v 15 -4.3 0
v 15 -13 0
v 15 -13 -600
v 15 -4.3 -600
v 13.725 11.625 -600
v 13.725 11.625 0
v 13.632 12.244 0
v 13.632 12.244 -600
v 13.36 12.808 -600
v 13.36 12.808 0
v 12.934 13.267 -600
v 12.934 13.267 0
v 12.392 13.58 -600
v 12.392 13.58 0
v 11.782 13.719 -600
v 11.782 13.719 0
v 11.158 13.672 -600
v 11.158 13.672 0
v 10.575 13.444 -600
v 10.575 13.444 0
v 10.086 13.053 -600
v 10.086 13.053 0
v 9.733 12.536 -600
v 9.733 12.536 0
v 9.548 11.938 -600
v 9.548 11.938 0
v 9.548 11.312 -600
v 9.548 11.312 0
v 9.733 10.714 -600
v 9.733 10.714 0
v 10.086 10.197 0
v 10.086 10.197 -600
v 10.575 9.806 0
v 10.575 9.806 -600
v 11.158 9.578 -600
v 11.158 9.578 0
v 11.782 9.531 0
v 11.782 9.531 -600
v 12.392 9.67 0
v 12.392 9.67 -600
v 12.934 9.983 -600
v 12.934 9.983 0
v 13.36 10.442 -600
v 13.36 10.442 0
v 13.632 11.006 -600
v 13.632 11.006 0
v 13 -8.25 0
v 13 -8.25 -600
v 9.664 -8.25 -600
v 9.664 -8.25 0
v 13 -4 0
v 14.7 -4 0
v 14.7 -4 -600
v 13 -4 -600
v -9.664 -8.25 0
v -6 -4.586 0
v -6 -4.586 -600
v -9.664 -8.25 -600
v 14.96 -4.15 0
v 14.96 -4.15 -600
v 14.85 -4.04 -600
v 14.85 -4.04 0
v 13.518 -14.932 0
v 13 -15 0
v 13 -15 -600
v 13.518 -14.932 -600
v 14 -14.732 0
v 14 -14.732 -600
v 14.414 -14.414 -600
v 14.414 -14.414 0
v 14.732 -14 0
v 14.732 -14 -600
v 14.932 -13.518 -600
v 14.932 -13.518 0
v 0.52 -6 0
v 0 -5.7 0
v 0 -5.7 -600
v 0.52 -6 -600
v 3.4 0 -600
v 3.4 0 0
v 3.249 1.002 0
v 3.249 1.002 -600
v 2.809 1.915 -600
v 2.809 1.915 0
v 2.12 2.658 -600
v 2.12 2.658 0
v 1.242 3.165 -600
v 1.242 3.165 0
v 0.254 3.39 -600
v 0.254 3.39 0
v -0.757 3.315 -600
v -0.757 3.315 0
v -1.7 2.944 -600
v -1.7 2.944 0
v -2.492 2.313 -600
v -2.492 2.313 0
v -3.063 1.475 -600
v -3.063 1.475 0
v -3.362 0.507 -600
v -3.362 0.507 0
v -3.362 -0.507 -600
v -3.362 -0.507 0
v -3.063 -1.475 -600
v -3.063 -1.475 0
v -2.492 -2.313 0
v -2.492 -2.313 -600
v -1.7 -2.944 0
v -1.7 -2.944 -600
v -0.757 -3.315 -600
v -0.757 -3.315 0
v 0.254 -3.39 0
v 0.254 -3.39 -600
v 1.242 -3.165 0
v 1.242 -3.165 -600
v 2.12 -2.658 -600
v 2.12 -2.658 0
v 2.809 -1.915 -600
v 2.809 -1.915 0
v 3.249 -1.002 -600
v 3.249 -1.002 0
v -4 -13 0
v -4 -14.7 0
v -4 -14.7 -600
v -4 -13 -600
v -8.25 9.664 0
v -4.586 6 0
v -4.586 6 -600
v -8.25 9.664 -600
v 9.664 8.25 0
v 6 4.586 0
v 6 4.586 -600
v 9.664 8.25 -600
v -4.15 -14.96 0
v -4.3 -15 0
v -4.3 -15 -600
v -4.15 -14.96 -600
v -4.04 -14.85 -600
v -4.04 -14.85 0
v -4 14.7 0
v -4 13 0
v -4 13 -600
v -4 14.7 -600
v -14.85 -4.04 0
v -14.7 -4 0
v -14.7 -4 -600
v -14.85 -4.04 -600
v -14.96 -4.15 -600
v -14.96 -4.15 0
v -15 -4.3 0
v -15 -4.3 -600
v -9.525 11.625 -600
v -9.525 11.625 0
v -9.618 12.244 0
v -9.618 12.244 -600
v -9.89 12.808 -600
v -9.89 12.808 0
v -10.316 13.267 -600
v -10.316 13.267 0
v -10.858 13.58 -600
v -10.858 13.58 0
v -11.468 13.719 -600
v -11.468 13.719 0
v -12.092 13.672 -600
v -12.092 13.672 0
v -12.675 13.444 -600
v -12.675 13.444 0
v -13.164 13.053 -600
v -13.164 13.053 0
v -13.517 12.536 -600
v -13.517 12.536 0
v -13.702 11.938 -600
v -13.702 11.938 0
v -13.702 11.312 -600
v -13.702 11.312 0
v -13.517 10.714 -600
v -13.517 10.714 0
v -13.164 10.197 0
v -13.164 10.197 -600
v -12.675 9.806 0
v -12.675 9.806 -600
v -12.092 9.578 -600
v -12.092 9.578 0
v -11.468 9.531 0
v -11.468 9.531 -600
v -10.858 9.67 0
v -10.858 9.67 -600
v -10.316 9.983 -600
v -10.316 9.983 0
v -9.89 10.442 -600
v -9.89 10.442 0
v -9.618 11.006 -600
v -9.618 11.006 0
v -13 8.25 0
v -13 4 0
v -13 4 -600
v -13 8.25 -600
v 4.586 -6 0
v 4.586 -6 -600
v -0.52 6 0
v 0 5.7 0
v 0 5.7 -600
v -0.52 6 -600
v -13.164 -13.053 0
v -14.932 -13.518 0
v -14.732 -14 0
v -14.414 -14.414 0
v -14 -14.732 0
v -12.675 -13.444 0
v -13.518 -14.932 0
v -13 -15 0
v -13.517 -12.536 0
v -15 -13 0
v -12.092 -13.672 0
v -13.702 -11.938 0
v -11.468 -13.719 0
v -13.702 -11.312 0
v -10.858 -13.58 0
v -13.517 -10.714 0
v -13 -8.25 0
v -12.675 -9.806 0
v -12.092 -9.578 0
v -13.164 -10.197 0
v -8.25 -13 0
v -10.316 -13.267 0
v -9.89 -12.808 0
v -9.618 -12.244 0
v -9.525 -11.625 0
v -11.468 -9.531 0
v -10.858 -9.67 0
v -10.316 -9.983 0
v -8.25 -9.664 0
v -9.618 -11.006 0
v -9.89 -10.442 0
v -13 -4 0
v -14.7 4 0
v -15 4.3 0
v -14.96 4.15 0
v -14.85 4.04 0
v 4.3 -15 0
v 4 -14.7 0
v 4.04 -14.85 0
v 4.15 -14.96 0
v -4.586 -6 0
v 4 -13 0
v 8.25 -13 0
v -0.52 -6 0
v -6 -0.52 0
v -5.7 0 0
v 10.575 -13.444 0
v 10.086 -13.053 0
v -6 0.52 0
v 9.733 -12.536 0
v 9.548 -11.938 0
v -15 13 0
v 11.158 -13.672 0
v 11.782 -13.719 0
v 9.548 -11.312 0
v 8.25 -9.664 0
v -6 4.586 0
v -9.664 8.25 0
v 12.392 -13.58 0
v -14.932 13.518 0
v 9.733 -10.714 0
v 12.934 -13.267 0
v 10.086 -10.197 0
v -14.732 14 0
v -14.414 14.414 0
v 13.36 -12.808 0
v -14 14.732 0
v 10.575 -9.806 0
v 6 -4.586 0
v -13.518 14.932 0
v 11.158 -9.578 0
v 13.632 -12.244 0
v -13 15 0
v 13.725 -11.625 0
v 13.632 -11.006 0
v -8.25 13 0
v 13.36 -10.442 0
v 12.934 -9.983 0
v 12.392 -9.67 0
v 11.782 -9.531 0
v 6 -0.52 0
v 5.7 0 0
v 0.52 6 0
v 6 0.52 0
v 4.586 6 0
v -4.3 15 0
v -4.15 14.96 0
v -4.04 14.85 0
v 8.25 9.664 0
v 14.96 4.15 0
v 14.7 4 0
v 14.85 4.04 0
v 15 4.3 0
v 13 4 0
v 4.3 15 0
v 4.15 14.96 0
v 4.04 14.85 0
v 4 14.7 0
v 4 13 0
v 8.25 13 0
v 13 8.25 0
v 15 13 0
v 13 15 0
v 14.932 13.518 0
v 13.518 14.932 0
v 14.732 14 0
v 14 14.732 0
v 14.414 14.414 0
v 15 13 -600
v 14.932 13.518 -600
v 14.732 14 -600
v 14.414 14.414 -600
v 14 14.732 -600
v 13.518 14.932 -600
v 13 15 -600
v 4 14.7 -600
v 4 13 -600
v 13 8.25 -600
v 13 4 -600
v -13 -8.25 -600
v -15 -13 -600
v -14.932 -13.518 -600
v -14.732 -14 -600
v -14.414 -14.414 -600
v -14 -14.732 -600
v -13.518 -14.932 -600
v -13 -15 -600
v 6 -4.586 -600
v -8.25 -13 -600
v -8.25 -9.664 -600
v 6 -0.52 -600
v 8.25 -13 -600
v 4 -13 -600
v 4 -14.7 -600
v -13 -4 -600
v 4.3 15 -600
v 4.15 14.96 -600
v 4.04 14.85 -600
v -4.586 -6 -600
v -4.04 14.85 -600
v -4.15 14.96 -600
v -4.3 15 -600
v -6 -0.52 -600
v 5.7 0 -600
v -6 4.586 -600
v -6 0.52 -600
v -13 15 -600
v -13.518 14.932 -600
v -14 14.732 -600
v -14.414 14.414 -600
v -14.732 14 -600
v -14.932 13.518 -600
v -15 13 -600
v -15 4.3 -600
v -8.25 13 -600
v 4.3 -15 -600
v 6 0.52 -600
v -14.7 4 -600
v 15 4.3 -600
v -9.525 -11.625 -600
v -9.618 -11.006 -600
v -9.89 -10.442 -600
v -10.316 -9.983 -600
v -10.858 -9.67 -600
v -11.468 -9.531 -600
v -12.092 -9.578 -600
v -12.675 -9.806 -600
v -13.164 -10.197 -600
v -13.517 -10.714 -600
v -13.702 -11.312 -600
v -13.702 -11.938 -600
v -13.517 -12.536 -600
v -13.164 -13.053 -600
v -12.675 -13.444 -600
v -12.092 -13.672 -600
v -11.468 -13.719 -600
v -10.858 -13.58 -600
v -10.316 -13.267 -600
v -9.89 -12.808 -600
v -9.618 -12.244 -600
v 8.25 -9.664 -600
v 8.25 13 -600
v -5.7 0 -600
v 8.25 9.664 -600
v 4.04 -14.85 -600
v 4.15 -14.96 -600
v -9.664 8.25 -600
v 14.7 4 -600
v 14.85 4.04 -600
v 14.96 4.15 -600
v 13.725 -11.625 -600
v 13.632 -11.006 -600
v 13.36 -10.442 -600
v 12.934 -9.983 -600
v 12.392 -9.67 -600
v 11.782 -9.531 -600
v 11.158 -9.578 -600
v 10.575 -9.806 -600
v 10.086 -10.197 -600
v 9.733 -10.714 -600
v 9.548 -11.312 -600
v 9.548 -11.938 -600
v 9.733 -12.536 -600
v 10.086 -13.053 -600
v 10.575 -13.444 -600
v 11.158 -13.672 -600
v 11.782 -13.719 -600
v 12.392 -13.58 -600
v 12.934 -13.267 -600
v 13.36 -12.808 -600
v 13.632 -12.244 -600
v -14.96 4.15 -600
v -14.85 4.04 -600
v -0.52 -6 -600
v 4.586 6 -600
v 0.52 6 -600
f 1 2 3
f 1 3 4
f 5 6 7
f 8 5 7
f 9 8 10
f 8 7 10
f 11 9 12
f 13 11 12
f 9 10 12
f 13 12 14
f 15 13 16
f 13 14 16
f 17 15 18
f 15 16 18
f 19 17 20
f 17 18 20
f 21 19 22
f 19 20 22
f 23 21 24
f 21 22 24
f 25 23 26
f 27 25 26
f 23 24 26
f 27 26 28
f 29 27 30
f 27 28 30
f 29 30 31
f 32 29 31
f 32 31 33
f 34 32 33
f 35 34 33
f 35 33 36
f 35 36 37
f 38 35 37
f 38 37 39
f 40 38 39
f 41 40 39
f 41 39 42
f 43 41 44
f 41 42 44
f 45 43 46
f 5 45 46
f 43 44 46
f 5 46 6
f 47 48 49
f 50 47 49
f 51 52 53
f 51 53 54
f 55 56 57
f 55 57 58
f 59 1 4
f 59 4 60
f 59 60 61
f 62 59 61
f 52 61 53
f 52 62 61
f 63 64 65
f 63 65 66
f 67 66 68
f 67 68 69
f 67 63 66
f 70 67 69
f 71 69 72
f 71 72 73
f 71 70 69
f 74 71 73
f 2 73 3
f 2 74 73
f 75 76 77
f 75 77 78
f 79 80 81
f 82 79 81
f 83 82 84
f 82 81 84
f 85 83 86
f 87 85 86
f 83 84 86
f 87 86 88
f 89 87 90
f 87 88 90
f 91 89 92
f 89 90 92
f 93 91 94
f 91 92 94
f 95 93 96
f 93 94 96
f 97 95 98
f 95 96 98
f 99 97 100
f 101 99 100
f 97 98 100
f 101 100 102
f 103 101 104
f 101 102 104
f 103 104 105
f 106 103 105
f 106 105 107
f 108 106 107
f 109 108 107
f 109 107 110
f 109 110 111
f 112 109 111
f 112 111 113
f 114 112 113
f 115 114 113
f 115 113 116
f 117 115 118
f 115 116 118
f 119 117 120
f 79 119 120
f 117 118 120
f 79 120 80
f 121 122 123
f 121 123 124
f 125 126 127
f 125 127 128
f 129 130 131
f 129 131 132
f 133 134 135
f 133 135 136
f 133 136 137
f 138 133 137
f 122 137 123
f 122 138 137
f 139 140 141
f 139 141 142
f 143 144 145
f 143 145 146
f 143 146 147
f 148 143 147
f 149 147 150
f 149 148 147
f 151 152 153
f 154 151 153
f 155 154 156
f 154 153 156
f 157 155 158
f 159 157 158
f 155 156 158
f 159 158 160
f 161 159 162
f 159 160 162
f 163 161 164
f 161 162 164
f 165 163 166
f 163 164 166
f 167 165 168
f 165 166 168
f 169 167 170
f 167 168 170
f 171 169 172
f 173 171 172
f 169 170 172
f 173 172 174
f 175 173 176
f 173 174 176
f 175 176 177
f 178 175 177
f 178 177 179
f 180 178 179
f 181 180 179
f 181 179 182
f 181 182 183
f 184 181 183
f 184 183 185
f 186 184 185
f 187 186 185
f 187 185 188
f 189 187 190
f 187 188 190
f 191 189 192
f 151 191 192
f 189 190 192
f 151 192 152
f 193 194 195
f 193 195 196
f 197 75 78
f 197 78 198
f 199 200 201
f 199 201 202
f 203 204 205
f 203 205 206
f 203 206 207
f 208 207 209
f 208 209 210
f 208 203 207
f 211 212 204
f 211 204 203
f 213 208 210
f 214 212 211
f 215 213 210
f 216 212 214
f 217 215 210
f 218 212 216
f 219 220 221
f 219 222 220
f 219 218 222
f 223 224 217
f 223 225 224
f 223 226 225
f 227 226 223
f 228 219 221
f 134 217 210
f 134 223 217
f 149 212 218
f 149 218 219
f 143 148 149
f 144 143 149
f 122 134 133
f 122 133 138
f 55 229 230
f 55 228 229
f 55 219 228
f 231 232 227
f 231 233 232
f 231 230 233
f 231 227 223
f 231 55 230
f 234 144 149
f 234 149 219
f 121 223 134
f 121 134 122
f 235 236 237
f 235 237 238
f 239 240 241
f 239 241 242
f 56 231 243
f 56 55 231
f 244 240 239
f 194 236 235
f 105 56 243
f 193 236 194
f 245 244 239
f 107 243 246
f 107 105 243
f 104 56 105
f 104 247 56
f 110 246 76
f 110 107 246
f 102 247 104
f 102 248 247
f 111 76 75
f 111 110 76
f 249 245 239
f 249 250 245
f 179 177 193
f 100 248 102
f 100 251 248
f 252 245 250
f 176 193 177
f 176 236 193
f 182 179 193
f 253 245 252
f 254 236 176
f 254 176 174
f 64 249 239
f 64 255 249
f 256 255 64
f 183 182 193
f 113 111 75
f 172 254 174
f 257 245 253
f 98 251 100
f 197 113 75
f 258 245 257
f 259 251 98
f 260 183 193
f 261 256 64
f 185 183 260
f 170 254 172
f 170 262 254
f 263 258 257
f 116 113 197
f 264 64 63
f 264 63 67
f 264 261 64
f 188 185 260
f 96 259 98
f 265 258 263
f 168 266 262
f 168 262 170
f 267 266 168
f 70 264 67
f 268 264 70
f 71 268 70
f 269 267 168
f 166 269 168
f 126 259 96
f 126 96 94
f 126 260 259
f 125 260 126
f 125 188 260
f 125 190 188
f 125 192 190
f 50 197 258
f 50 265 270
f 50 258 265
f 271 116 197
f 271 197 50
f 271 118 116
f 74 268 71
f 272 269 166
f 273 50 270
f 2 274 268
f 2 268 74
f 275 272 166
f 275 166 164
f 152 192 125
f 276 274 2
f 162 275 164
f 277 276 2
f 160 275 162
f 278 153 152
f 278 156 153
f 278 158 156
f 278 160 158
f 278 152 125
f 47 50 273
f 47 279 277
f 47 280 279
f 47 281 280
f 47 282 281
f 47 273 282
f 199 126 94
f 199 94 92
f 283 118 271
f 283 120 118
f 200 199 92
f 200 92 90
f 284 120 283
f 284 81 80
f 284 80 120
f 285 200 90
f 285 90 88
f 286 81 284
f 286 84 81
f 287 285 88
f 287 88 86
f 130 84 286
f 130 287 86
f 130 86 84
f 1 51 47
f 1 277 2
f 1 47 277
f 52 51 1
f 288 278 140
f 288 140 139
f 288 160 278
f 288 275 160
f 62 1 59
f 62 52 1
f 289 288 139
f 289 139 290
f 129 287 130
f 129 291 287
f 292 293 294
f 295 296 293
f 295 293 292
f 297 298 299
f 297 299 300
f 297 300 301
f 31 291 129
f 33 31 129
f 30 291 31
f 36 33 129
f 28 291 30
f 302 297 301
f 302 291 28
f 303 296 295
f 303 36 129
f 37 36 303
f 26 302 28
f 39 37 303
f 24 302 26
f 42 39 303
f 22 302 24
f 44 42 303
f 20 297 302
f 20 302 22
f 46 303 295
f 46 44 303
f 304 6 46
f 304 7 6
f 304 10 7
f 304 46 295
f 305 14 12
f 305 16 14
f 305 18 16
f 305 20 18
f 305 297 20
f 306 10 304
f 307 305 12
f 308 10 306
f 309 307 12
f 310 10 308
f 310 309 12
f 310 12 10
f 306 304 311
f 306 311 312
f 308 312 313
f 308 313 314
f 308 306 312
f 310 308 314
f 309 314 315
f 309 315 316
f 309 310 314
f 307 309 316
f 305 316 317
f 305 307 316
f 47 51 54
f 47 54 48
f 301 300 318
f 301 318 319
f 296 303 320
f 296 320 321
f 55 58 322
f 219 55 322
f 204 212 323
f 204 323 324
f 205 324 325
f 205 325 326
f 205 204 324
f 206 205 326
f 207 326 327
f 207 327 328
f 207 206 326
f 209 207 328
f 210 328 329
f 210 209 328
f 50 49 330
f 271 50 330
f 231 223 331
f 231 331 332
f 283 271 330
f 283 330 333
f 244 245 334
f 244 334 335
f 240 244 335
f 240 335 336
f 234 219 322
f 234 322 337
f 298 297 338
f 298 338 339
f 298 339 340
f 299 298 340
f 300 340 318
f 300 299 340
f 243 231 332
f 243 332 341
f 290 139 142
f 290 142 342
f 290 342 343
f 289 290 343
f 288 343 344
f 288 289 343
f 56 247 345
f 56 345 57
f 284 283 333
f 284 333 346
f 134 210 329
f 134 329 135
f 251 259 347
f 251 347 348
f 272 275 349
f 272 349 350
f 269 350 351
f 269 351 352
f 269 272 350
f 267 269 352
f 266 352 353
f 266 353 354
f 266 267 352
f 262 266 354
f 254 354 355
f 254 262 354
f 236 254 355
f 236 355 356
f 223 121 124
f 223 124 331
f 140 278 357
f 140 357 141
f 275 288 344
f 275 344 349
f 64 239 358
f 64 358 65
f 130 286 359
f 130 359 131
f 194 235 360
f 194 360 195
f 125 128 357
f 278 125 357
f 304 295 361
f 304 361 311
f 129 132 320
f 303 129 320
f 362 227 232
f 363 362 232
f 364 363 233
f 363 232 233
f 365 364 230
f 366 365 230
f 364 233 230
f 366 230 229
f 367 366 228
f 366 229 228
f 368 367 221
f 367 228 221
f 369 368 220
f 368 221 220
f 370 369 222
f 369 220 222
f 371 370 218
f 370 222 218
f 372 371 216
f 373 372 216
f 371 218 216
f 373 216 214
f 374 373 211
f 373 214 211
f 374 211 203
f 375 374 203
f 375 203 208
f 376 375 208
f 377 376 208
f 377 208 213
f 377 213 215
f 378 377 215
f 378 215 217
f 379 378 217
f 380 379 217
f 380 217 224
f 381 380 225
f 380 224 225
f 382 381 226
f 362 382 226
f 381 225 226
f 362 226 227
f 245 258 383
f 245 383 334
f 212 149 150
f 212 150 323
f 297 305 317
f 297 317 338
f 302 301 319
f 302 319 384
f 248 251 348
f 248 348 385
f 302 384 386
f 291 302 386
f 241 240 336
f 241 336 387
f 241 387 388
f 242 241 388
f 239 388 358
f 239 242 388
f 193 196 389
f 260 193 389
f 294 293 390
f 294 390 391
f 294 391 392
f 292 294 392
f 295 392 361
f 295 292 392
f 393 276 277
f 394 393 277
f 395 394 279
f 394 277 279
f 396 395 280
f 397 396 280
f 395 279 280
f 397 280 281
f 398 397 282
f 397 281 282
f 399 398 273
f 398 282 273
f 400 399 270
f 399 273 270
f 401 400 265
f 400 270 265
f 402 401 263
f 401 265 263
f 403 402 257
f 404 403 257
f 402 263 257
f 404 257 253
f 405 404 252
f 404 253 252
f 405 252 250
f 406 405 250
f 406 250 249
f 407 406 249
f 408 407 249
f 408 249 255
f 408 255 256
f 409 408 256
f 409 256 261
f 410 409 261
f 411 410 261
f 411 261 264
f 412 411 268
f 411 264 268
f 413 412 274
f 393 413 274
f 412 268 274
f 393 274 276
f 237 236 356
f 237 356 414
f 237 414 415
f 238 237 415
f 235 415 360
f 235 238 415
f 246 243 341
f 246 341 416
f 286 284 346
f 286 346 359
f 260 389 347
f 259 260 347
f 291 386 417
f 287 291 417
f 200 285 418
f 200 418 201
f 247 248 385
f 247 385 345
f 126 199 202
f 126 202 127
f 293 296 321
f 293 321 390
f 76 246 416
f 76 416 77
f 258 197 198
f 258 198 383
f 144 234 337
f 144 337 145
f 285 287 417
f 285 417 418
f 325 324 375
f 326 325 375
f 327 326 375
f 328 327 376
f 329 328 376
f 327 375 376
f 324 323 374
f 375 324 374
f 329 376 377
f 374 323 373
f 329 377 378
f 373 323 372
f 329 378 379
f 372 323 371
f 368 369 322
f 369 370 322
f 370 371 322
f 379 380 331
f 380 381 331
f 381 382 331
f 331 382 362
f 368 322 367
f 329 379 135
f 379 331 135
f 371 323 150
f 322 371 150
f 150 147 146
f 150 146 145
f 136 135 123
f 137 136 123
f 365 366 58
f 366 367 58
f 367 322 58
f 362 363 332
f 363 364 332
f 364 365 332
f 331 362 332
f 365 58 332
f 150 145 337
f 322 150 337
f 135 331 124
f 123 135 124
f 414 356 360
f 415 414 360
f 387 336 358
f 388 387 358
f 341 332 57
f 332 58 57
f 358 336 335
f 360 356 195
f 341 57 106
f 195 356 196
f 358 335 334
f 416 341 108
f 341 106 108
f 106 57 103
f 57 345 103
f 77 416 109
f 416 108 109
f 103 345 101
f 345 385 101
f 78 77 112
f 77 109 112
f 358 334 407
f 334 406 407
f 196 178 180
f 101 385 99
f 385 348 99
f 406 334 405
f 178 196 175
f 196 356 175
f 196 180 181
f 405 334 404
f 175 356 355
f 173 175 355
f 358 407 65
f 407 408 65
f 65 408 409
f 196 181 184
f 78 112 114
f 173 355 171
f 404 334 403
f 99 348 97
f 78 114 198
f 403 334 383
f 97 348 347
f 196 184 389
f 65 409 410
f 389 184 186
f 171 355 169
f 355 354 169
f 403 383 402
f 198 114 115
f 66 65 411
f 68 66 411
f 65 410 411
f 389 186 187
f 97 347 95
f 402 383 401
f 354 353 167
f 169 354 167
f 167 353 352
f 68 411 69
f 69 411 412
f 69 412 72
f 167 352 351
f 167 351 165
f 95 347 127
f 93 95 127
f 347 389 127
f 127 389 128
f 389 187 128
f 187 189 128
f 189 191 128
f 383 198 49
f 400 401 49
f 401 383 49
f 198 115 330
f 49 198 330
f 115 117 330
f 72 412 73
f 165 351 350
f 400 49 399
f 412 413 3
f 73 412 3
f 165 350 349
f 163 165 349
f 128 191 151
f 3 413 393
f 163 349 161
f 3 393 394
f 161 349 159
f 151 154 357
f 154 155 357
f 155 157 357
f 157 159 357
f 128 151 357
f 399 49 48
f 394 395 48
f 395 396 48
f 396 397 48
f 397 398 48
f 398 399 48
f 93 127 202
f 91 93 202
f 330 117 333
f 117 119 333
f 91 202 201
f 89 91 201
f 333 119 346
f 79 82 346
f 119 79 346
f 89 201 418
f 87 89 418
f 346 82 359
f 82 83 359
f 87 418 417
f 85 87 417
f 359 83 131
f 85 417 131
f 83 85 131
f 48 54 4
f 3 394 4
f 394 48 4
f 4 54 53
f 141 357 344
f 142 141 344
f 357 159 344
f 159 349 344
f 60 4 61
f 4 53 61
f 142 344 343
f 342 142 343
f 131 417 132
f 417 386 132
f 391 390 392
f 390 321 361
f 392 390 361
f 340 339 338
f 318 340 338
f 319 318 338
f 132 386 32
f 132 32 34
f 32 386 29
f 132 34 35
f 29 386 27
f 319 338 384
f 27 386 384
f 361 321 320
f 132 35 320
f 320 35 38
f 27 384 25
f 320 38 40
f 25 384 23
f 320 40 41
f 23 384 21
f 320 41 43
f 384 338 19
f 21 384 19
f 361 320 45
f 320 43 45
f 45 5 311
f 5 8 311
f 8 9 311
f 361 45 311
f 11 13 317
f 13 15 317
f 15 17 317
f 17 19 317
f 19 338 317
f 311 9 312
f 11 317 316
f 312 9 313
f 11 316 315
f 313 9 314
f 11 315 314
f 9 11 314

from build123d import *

# Parameters (mm, degrees)
SKETCH1_R           = 2.1
SKETCH1_R_2         = 3.4
BOSS_EXTRUDE1_DEPTH = 600


with BuildPart() as part:
    # Sketch1 → Boss-Extrude1 (new body)
    with BuildSketch(Plane.XY):
        with BuildLine():
            Line((-15, -4.3), (-15, -13))
            ThreePointArc((-15, -13), (-14.414213562, -14.414213562), (-13, -15))
            Line((-13, -15), (-4.3, -15))
            ThreePointArc((-4.3, -15), (-4.087867966, -14.912132034), (-4, -14.7))
            Line((-4, -14.7), (-4, -13))
            Line((-4, -13), (-8.249996, -13))
            Line((-8.249996, -13), (-8.249996, -9.664209562))
            Line((-8.249996, -9.664209562), (-4.585786438, -6))
            Line((-4.585786438, -6), (-0.519615242, -6))
            Line((-0.519615242, -6), (0, -5.7))
            Line((0, -5.7), (0.519615242, -6))
            Line((0.519615242, -6), (4.585786438, -6))
            Line((4.585786438, -6), (8.250004, -9.664217562))
            Line((8.250004, -9.664217562), (8.250004, -13))
            Line((8.250004, -13), (4, -13))
            Line((4, -13), (4, -14.7))
            ThreePointArc((4, -14.7), (4.087867966, -14.912132034), (4.3, -15))
            Line((4.3, -15), (13, -15))
            ThreePointArc((13, -15), (14.414213562, -14.414213562), (15, -13))
            Line((15, -13), (15, -4.3))
            ThreePointArc((15, -4.3), (14.912132034, -4.087867966), (14.7, -4))
            Line((14.7, -4), (13, -4))
            Line((13, -4), (13, -8.25))
            Line((13, -8.25), (9.664213562, -8.25))
            Line((9.664213562, -8.25), (6, -4.585786438))
            Line((6, -4.585786438), (6, -0.519615242))
            Line((6, -0.519615242), (5.7, 0))
            Line((5.7, 0), (6, 0.519615242))
            Line((6, 0.519615242), (6, 4.585786438))
            Line((6, 4.585786438), (9.664213562, 8.25))
            Line((9.664213562, 8.25), (13, 8.25))
            Line((13, 8.25), (13, 4))
            Line((13, 4), (14.7, 4))
            ThreePointArc((14.7, 4), (14.912132034, 4.087867966), (15, 4.3))
            Line((15, 4.3), (15, 13))
            ThreePointArc((15, 13), (14.414213562, 14.414213562), (13, 15))
            Line((13, 15), (4.3, 15))
            ThreePointArc((4.3, 15), (4.087867966, 14.912132034), (4, 14.7))
            Line((4, 14.7), (4, 13))
            Line((4, 13), (8.25, 13))
            Line((8.25, 13), (8.25, 9.664213562))
            Line((8.25, 9.664213562), (4.585786438, 6))
            Line((4.585786438, 6), (0.519615242, 6))
            Line((0.519615242, 6), (0, 5.7))
            Line((0, 5.7), (-0.519615242, 6))
            Line((-0.519615242, 6), (-4.585786438, 6))
            Line((-4.585786438, 6), (-8.25, 9.664213562))
            Line((-8.25, 9.664213562), (-8.25, 13))
            Line((-8.25, 13), (-4, 13))
            Line((-4, 13), (-4, 14.7))
            ThreePointArc((-4, 14.7), (-4.087867966, 14.912132034), (-4.3, 15))
            Line((-4.3, 15), (-13, 15))
            ThreePointArc((-13, 15), (-14.414213562, 14.414213562), (-15, 13))
            Line((-15, 13), (-15, 4.3))
            ThreePointArc((-15, 4.3), (-14.912132034, 4.087867966), (-14.7, 4))
            Line((-14.7, 4), (-13, 4))
            Line((-13, 4), (-13, 8.25))
            Line((-13, 8.25), (-9.664213562, 8.25))
            Line((-9.664213562, 8.25), (-6, 4.585786438))
            Line((-6, 4.585786438), (-6, 0.519615242))
            Line((-6, 0.519615242), (-5.7, 0))
            Line((-5.7, 0), (-6, -0.519615242))
            Line((-6, -0.519615242), (-6, -4.585786438))
            Line((-6, -4.585786438), (-9.664213562, -8.25))
            Line((-9.664213562, -8.25), (-13, -8.25))
            Line((-13, -8.25), (-13, -4))
            Line((-13, -4), (-14.7, -4))
            ThreePointArc((-14.7, -4), (-14.912132034, -4.087867966), (-15, -4.3))
        make_face()
        with Locations((11.625, -11.625)):
            Circle(SKETCH1_R, mode=Mode.SUBTRACT)
        with Locations((11.625, 11.625)):
            Circle(SKETCH1_R, mode=Mode.SUBTRACT)
        Circle(SKETCH1_R_2, mode=Mode.SUBTRACT)
        with Locations((-11.625, -11.625)):
            Circle(SKETCH1_R, mode=Mode.SUBTRACT)
        with Locations((-11.625, 11.625)):
            Circle(SKETCH1_R, mode=Mode.SUBTRACT)
    extrude(amount=-BOSS_EXTRUDE1_DEPTH)


solid = part.part
